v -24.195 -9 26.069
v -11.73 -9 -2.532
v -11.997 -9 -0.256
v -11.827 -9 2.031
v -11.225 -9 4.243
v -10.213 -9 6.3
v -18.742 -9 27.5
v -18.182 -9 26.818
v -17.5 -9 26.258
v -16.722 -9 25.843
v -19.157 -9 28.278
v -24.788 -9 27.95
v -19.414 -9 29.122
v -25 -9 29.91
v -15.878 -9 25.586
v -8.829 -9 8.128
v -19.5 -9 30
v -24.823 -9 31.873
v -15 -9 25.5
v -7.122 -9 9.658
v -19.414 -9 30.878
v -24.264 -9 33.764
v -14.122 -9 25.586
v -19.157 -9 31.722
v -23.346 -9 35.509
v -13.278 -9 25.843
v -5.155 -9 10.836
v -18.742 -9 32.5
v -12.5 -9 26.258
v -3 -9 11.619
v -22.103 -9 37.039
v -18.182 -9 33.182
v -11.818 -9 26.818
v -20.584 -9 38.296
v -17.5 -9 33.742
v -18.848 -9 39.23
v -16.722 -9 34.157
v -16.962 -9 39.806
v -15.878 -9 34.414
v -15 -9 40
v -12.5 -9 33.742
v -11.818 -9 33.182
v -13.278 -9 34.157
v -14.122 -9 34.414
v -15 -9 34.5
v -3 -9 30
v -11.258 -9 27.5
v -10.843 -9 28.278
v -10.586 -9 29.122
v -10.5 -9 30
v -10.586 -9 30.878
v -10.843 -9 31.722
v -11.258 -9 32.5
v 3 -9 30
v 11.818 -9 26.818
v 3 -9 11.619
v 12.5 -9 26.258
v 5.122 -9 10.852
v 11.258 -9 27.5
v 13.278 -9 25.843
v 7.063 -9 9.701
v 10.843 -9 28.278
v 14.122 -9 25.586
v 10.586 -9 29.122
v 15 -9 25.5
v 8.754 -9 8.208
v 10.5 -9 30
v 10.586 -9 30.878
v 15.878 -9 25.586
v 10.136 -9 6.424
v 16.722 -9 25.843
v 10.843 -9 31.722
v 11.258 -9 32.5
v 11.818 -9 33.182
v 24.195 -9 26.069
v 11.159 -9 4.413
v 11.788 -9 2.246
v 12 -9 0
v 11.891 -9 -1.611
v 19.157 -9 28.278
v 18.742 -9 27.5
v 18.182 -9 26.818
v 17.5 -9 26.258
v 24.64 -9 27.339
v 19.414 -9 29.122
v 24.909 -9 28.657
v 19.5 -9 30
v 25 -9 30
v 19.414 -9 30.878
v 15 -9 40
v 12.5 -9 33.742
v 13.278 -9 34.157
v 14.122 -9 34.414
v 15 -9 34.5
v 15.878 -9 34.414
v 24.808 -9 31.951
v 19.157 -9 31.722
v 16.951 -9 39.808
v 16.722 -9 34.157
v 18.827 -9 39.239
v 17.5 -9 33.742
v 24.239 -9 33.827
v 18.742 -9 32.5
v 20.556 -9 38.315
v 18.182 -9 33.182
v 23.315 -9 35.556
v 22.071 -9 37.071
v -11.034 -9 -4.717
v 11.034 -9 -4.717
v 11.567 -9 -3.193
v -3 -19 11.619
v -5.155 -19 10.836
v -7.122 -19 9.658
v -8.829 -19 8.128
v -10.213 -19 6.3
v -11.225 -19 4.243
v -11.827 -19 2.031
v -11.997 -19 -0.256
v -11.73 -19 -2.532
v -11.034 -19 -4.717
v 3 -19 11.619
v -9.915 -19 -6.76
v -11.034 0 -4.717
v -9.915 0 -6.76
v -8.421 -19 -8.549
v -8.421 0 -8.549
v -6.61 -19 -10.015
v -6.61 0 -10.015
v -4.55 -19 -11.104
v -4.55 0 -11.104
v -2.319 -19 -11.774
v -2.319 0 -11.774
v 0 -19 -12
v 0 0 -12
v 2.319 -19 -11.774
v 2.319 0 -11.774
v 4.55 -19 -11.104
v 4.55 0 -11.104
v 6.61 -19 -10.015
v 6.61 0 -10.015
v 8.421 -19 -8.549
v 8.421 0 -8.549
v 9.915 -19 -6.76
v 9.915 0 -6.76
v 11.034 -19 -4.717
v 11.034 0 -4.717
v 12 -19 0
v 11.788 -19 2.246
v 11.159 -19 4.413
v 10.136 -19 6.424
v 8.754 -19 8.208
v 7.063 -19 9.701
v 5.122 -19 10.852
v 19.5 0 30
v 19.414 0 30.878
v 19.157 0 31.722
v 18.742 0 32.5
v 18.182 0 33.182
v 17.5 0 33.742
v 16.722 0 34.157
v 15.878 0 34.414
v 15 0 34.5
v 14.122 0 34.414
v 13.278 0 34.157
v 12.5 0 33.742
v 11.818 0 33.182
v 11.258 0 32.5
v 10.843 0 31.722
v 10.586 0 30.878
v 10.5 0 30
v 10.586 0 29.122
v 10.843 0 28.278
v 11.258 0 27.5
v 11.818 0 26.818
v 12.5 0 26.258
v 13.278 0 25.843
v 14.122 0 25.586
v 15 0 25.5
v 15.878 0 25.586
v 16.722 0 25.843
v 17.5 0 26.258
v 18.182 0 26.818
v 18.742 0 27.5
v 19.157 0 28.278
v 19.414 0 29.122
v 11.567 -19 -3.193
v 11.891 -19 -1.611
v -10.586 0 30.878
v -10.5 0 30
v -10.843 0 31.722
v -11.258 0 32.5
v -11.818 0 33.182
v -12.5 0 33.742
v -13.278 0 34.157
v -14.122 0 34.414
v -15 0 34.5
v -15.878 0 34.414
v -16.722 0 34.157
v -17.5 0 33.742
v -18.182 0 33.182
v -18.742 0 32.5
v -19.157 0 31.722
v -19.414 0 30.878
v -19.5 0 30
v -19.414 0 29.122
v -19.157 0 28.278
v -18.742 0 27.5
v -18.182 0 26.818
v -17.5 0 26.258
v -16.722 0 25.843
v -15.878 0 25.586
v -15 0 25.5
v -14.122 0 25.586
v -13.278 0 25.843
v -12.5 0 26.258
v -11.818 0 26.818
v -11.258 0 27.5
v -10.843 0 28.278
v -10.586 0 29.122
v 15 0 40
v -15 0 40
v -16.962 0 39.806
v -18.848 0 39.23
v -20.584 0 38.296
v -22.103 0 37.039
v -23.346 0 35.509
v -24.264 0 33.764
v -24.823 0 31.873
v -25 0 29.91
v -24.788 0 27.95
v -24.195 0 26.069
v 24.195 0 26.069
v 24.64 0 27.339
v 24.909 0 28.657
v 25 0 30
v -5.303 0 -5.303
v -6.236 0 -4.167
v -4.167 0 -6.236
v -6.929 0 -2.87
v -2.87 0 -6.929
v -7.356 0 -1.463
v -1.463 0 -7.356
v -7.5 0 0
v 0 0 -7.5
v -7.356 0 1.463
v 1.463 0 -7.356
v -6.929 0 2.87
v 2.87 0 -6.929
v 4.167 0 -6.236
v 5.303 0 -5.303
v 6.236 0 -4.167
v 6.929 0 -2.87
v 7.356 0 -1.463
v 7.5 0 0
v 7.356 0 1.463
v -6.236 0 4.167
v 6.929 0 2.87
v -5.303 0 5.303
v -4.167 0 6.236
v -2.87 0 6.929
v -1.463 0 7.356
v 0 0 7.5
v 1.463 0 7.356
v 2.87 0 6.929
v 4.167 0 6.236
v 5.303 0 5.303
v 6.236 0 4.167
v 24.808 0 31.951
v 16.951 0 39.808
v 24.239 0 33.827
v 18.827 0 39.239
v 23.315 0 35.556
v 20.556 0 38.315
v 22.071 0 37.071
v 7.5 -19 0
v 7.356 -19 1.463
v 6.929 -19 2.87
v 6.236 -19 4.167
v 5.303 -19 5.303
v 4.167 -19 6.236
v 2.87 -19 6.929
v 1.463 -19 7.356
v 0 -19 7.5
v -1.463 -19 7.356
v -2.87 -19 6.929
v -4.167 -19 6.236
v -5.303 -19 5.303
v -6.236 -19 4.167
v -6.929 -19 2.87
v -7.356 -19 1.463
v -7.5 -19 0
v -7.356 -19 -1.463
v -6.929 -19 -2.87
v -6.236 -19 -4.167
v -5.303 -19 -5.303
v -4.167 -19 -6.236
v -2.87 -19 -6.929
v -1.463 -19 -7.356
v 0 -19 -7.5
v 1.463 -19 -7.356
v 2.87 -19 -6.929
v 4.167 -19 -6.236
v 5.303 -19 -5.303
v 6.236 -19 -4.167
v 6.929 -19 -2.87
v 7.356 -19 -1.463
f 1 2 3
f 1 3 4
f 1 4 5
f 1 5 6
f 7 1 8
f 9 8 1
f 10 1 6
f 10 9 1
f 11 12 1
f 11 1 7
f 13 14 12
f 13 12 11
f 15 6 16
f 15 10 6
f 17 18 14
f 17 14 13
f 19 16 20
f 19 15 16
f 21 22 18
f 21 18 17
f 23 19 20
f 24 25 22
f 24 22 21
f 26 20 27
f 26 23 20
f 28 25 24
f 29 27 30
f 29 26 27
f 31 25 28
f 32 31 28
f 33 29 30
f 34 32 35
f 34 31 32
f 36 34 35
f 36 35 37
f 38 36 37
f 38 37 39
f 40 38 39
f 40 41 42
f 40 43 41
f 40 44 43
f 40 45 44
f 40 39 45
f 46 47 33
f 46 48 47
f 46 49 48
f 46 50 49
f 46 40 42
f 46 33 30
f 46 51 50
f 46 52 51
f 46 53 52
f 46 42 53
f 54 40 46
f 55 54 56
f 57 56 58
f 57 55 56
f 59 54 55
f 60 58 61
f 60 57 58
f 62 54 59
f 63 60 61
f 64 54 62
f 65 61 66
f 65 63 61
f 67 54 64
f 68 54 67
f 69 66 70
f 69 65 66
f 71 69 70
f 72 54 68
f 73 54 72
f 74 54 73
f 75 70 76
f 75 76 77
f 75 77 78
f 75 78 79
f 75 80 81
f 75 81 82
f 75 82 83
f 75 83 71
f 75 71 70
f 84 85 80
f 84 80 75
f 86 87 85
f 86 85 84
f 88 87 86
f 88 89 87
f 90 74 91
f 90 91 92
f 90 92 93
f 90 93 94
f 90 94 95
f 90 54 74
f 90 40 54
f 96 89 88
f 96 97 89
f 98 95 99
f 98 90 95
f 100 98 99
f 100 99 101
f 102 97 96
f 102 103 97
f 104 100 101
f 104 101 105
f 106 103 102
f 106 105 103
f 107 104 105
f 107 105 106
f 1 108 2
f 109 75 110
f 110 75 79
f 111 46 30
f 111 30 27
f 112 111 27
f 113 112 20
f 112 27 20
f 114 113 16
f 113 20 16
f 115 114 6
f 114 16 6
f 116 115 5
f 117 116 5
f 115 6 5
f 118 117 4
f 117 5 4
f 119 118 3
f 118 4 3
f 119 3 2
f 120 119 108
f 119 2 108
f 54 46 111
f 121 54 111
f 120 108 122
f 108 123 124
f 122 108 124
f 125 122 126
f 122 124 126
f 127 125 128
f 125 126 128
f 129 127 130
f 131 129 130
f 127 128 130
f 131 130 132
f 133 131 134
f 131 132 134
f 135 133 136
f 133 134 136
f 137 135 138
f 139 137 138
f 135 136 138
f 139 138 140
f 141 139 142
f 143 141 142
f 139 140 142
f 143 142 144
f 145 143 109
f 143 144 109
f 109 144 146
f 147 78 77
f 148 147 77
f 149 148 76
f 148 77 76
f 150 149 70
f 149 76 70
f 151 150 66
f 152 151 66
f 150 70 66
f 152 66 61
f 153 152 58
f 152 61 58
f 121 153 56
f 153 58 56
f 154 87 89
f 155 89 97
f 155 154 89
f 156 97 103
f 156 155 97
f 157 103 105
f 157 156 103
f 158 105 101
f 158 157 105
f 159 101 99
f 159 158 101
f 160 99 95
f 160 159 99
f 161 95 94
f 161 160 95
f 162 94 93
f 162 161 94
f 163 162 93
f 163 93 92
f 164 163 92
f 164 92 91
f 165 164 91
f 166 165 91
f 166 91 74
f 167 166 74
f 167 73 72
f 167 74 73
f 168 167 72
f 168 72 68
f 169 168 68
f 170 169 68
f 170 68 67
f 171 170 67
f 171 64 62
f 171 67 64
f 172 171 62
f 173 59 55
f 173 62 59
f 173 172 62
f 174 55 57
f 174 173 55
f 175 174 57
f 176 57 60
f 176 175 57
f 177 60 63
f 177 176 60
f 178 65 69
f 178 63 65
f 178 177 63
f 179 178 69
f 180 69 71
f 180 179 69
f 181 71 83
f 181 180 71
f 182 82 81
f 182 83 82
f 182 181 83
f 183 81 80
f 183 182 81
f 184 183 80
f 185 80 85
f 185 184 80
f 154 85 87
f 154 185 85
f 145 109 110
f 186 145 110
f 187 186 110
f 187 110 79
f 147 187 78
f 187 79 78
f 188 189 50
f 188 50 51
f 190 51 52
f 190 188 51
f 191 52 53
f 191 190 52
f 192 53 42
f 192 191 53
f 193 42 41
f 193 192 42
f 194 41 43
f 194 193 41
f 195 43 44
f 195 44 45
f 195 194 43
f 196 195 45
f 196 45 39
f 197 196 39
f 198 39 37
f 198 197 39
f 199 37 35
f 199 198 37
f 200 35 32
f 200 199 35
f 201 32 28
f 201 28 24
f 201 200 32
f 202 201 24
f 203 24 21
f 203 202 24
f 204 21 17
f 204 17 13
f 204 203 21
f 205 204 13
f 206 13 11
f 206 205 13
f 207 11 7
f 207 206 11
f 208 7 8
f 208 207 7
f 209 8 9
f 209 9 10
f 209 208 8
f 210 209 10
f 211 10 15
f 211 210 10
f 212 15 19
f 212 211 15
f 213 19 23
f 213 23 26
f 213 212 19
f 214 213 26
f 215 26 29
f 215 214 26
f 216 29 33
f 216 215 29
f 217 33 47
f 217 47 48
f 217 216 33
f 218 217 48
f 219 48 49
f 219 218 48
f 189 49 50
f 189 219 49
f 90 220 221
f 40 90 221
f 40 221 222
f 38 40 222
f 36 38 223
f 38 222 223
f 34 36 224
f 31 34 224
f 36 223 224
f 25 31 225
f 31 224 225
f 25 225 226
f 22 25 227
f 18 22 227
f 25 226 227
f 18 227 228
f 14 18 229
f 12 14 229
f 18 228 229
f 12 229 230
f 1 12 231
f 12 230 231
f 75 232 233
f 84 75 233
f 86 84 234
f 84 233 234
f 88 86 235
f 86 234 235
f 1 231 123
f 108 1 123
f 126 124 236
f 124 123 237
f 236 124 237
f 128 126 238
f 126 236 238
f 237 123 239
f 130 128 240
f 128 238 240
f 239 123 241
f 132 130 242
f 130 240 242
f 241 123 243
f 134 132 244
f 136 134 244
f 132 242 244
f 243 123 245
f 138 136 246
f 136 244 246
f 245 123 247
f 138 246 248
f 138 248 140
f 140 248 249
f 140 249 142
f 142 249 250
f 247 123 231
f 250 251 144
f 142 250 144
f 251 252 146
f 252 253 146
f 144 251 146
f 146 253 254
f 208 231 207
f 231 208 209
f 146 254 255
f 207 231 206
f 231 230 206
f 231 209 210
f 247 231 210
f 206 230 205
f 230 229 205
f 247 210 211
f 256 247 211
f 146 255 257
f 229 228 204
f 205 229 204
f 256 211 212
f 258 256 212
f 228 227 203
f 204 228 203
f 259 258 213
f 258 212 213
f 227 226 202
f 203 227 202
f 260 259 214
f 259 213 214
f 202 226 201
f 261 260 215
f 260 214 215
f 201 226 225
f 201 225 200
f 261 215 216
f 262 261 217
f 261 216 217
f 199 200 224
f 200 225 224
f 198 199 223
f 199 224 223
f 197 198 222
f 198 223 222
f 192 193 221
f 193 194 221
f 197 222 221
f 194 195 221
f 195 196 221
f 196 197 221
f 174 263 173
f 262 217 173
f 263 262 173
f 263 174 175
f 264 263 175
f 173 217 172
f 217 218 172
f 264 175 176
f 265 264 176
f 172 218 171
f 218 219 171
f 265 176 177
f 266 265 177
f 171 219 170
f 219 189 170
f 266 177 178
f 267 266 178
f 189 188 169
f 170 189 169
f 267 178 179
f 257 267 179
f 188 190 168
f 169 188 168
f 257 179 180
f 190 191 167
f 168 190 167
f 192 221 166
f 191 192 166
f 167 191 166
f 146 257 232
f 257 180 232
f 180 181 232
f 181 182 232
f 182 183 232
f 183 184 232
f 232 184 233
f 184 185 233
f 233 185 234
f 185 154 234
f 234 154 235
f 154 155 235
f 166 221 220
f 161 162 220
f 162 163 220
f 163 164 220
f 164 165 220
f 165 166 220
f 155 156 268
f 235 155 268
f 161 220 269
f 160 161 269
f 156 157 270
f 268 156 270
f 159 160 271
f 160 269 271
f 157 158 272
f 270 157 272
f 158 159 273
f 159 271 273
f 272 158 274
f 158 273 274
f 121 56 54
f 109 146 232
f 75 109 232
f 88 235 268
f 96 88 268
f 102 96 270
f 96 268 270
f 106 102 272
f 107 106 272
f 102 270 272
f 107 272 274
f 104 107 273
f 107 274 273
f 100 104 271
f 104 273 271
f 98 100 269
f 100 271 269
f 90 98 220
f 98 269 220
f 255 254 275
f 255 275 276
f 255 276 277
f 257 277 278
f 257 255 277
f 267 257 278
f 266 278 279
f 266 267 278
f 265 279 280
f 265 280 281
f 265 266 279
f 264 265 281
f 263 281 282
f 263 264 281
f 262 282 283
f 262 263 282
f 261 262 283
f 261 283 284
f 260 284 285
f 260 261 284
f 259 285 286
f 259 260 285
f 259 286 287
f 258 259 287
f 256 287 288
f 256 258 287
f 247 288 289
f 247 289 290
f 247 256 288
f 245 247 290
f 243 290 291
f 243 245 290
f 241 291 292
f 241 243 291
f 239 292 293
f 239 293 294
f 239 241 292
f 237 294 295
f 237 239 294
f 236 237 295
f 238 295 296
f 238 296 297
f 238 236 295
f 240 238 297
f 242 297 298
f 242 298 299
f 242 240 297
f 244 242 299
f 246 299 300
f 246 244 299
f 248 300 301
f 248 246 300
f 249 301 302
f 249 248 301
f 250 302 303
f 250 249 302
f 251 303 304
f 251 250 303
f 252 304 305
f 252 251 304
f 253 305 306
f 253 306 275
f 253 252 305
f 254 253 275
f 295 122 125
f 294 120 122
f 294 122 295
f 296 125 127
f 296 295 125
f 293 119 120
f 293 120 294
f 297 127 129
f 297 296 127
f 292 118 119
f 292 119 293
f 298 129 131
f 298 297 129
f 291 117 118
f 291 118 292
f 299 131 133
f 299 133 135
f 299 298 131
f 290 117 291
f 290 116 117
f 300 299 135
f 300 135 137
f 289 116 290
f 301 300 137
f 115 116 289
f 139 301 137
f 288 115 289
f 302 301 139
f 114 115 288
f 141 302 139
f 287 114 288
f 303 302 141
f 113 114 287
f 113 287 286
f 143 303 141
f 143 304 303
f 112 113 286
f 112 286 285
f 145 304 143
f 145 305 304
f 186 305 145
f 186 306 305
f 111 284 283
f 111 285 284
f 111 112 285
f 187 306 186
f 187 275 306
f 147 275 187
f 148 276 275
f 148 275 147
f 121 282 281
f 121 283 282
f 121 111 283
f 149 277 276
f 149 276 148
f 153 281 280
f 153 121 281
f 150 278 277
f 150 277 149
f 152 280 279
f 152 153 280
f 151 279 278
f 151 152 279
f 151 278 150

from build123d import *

# Parameters (mm, degrees)
F0_R     = 4.5
F1_DEPTH = 9
F2_DEPTH = 19
F0_R_2   = 7.5
F4_DEPTH = 19
F5_DEPTH = 28.001


with BuildPart() as f1:
    # F0 (on Front) → F1 (new body)
    with BuildSketch(Plane.XZ):
        with BuildLine():
            ThreePointArc((-3, 11.61895), (0, 12), (3, 11.61895))
            Line((3, 11.61895), (3, 30))
            Line((3, 30), (-3, 30))
            Line((-3, 30), (-3, 11.61895))
        make_face()
        with BuildLine():
            ThreePointArc((3, 11.61895), (9.486833, 7.348469), (12, 0))
            ThreePointArc((12, 0), (11.756027, -2.407453), (11.034028, -4.717014))
            Line((11.034028, -4.717014), (24.195023, 26.069155))
            ThreePointArc((24.195023, 26.069155), (6.654089, 24.4913), (15, 40))
            Line((15, 40), (-15, 40))
            ThreePointArc((-15, 40), (-7.928932, 37.071068), (-5, 30))
            ThreePointArc((-5, 30), (-12.993789, 20.203311), (-24.195023, 26.069155))
            Line((-24.195023, 26.069155), (-11.034028, -4.717014))
            ThreePointArc((-11.034028, -4.717014), (-10.768213, 5.295808), (-3, 11.61895))
            Line((-3, 11.61895), (-3, 30))
            Line((-3, 30), (3, 30))
            Line((3, 30), (3, 11.61895))
        make_face()
        with BuildLine():
            ThreePointArc((-15, 40), (-23.345911, 35.5087), (-24.195023, 26.069155))
            ThreePointArc((-24.195023, 26.069155), (-12.993789, 20.203311), (-5, 30))
            ThreePointArc((-5, 30), (-7.928932, 37.071068), (-15, 40))
        make_face()
        with Locations((-15, 30)):
            Circle(F0_R, mode=Mode.SUBTRACT)
        with BuildLine():
            ThreePointArc((15, 40), (6.654089, 24.4913), (24.195023, 26.069155))
            ThreePointArc((24.195023, 26.069155), (24.796689, 27.993789), (25, 30))
            ThreePointArc((25, 30), (22.071068, 37.071068), (15, 40))
        make_face()
        with Locations((15, 30)):
            Circle(F0_R, mode=Mode.SUBTRACT)
    extrude(amount=F1_DEPTH)

    # F0 (on Front) → F2 (join)
    with BuildSketch(Plane.XZ):
        with BuildLine():
            ThreePointArc((-3, 11.61895), (0, 12), (3, 11.61895))
            Line((3, 11.61895), (3, 30))
            Line((3, 30), (-3, 30))
            Line((-3, 30), (-3, 11.61895))
        make_face()
    extrude(amount=F2_DEPTH)

    # F0 (on Front) → F4 (join)
    with BuildSketch(Plane.XZ):
        with BuildLine():
            ThreePointArc((11.034028, -4.717014), (11.756027, -2.407453), (12, 0))
            ThreePointArc((12, 0), (9.486833, 7.348469), (3, 11.61895))
            ThreePointArc((3, 11.61895), (0, 12), (-3, 11.61895))
            ThreePointArc((-3, 11.61895), (-10.768213, 5.295808), (-11.034028, -4.717014))
            ThreePointArc((-11.034028, -4.717014), (0, -12), (11.034028, -4.717014))
        make_face()
        Circle(F0_R_2, mode=Mode.SUBTRACT)
    extrude(amount=F4_DEPTH)

    # F3 (on face) → F5 (cut, through all)
    with BuildSketch(Plane(origin=(-3, 0, 0), x_dir=(0, -1, 0), z_dir=(-1, 0, 0))):
        Polygon((19, 30), (9, 30), (19, 11.61895), align=None)
    extrude(amount=-F5_DEPTH, mode=Mode.SUBTRACT)


solid = f1.part
